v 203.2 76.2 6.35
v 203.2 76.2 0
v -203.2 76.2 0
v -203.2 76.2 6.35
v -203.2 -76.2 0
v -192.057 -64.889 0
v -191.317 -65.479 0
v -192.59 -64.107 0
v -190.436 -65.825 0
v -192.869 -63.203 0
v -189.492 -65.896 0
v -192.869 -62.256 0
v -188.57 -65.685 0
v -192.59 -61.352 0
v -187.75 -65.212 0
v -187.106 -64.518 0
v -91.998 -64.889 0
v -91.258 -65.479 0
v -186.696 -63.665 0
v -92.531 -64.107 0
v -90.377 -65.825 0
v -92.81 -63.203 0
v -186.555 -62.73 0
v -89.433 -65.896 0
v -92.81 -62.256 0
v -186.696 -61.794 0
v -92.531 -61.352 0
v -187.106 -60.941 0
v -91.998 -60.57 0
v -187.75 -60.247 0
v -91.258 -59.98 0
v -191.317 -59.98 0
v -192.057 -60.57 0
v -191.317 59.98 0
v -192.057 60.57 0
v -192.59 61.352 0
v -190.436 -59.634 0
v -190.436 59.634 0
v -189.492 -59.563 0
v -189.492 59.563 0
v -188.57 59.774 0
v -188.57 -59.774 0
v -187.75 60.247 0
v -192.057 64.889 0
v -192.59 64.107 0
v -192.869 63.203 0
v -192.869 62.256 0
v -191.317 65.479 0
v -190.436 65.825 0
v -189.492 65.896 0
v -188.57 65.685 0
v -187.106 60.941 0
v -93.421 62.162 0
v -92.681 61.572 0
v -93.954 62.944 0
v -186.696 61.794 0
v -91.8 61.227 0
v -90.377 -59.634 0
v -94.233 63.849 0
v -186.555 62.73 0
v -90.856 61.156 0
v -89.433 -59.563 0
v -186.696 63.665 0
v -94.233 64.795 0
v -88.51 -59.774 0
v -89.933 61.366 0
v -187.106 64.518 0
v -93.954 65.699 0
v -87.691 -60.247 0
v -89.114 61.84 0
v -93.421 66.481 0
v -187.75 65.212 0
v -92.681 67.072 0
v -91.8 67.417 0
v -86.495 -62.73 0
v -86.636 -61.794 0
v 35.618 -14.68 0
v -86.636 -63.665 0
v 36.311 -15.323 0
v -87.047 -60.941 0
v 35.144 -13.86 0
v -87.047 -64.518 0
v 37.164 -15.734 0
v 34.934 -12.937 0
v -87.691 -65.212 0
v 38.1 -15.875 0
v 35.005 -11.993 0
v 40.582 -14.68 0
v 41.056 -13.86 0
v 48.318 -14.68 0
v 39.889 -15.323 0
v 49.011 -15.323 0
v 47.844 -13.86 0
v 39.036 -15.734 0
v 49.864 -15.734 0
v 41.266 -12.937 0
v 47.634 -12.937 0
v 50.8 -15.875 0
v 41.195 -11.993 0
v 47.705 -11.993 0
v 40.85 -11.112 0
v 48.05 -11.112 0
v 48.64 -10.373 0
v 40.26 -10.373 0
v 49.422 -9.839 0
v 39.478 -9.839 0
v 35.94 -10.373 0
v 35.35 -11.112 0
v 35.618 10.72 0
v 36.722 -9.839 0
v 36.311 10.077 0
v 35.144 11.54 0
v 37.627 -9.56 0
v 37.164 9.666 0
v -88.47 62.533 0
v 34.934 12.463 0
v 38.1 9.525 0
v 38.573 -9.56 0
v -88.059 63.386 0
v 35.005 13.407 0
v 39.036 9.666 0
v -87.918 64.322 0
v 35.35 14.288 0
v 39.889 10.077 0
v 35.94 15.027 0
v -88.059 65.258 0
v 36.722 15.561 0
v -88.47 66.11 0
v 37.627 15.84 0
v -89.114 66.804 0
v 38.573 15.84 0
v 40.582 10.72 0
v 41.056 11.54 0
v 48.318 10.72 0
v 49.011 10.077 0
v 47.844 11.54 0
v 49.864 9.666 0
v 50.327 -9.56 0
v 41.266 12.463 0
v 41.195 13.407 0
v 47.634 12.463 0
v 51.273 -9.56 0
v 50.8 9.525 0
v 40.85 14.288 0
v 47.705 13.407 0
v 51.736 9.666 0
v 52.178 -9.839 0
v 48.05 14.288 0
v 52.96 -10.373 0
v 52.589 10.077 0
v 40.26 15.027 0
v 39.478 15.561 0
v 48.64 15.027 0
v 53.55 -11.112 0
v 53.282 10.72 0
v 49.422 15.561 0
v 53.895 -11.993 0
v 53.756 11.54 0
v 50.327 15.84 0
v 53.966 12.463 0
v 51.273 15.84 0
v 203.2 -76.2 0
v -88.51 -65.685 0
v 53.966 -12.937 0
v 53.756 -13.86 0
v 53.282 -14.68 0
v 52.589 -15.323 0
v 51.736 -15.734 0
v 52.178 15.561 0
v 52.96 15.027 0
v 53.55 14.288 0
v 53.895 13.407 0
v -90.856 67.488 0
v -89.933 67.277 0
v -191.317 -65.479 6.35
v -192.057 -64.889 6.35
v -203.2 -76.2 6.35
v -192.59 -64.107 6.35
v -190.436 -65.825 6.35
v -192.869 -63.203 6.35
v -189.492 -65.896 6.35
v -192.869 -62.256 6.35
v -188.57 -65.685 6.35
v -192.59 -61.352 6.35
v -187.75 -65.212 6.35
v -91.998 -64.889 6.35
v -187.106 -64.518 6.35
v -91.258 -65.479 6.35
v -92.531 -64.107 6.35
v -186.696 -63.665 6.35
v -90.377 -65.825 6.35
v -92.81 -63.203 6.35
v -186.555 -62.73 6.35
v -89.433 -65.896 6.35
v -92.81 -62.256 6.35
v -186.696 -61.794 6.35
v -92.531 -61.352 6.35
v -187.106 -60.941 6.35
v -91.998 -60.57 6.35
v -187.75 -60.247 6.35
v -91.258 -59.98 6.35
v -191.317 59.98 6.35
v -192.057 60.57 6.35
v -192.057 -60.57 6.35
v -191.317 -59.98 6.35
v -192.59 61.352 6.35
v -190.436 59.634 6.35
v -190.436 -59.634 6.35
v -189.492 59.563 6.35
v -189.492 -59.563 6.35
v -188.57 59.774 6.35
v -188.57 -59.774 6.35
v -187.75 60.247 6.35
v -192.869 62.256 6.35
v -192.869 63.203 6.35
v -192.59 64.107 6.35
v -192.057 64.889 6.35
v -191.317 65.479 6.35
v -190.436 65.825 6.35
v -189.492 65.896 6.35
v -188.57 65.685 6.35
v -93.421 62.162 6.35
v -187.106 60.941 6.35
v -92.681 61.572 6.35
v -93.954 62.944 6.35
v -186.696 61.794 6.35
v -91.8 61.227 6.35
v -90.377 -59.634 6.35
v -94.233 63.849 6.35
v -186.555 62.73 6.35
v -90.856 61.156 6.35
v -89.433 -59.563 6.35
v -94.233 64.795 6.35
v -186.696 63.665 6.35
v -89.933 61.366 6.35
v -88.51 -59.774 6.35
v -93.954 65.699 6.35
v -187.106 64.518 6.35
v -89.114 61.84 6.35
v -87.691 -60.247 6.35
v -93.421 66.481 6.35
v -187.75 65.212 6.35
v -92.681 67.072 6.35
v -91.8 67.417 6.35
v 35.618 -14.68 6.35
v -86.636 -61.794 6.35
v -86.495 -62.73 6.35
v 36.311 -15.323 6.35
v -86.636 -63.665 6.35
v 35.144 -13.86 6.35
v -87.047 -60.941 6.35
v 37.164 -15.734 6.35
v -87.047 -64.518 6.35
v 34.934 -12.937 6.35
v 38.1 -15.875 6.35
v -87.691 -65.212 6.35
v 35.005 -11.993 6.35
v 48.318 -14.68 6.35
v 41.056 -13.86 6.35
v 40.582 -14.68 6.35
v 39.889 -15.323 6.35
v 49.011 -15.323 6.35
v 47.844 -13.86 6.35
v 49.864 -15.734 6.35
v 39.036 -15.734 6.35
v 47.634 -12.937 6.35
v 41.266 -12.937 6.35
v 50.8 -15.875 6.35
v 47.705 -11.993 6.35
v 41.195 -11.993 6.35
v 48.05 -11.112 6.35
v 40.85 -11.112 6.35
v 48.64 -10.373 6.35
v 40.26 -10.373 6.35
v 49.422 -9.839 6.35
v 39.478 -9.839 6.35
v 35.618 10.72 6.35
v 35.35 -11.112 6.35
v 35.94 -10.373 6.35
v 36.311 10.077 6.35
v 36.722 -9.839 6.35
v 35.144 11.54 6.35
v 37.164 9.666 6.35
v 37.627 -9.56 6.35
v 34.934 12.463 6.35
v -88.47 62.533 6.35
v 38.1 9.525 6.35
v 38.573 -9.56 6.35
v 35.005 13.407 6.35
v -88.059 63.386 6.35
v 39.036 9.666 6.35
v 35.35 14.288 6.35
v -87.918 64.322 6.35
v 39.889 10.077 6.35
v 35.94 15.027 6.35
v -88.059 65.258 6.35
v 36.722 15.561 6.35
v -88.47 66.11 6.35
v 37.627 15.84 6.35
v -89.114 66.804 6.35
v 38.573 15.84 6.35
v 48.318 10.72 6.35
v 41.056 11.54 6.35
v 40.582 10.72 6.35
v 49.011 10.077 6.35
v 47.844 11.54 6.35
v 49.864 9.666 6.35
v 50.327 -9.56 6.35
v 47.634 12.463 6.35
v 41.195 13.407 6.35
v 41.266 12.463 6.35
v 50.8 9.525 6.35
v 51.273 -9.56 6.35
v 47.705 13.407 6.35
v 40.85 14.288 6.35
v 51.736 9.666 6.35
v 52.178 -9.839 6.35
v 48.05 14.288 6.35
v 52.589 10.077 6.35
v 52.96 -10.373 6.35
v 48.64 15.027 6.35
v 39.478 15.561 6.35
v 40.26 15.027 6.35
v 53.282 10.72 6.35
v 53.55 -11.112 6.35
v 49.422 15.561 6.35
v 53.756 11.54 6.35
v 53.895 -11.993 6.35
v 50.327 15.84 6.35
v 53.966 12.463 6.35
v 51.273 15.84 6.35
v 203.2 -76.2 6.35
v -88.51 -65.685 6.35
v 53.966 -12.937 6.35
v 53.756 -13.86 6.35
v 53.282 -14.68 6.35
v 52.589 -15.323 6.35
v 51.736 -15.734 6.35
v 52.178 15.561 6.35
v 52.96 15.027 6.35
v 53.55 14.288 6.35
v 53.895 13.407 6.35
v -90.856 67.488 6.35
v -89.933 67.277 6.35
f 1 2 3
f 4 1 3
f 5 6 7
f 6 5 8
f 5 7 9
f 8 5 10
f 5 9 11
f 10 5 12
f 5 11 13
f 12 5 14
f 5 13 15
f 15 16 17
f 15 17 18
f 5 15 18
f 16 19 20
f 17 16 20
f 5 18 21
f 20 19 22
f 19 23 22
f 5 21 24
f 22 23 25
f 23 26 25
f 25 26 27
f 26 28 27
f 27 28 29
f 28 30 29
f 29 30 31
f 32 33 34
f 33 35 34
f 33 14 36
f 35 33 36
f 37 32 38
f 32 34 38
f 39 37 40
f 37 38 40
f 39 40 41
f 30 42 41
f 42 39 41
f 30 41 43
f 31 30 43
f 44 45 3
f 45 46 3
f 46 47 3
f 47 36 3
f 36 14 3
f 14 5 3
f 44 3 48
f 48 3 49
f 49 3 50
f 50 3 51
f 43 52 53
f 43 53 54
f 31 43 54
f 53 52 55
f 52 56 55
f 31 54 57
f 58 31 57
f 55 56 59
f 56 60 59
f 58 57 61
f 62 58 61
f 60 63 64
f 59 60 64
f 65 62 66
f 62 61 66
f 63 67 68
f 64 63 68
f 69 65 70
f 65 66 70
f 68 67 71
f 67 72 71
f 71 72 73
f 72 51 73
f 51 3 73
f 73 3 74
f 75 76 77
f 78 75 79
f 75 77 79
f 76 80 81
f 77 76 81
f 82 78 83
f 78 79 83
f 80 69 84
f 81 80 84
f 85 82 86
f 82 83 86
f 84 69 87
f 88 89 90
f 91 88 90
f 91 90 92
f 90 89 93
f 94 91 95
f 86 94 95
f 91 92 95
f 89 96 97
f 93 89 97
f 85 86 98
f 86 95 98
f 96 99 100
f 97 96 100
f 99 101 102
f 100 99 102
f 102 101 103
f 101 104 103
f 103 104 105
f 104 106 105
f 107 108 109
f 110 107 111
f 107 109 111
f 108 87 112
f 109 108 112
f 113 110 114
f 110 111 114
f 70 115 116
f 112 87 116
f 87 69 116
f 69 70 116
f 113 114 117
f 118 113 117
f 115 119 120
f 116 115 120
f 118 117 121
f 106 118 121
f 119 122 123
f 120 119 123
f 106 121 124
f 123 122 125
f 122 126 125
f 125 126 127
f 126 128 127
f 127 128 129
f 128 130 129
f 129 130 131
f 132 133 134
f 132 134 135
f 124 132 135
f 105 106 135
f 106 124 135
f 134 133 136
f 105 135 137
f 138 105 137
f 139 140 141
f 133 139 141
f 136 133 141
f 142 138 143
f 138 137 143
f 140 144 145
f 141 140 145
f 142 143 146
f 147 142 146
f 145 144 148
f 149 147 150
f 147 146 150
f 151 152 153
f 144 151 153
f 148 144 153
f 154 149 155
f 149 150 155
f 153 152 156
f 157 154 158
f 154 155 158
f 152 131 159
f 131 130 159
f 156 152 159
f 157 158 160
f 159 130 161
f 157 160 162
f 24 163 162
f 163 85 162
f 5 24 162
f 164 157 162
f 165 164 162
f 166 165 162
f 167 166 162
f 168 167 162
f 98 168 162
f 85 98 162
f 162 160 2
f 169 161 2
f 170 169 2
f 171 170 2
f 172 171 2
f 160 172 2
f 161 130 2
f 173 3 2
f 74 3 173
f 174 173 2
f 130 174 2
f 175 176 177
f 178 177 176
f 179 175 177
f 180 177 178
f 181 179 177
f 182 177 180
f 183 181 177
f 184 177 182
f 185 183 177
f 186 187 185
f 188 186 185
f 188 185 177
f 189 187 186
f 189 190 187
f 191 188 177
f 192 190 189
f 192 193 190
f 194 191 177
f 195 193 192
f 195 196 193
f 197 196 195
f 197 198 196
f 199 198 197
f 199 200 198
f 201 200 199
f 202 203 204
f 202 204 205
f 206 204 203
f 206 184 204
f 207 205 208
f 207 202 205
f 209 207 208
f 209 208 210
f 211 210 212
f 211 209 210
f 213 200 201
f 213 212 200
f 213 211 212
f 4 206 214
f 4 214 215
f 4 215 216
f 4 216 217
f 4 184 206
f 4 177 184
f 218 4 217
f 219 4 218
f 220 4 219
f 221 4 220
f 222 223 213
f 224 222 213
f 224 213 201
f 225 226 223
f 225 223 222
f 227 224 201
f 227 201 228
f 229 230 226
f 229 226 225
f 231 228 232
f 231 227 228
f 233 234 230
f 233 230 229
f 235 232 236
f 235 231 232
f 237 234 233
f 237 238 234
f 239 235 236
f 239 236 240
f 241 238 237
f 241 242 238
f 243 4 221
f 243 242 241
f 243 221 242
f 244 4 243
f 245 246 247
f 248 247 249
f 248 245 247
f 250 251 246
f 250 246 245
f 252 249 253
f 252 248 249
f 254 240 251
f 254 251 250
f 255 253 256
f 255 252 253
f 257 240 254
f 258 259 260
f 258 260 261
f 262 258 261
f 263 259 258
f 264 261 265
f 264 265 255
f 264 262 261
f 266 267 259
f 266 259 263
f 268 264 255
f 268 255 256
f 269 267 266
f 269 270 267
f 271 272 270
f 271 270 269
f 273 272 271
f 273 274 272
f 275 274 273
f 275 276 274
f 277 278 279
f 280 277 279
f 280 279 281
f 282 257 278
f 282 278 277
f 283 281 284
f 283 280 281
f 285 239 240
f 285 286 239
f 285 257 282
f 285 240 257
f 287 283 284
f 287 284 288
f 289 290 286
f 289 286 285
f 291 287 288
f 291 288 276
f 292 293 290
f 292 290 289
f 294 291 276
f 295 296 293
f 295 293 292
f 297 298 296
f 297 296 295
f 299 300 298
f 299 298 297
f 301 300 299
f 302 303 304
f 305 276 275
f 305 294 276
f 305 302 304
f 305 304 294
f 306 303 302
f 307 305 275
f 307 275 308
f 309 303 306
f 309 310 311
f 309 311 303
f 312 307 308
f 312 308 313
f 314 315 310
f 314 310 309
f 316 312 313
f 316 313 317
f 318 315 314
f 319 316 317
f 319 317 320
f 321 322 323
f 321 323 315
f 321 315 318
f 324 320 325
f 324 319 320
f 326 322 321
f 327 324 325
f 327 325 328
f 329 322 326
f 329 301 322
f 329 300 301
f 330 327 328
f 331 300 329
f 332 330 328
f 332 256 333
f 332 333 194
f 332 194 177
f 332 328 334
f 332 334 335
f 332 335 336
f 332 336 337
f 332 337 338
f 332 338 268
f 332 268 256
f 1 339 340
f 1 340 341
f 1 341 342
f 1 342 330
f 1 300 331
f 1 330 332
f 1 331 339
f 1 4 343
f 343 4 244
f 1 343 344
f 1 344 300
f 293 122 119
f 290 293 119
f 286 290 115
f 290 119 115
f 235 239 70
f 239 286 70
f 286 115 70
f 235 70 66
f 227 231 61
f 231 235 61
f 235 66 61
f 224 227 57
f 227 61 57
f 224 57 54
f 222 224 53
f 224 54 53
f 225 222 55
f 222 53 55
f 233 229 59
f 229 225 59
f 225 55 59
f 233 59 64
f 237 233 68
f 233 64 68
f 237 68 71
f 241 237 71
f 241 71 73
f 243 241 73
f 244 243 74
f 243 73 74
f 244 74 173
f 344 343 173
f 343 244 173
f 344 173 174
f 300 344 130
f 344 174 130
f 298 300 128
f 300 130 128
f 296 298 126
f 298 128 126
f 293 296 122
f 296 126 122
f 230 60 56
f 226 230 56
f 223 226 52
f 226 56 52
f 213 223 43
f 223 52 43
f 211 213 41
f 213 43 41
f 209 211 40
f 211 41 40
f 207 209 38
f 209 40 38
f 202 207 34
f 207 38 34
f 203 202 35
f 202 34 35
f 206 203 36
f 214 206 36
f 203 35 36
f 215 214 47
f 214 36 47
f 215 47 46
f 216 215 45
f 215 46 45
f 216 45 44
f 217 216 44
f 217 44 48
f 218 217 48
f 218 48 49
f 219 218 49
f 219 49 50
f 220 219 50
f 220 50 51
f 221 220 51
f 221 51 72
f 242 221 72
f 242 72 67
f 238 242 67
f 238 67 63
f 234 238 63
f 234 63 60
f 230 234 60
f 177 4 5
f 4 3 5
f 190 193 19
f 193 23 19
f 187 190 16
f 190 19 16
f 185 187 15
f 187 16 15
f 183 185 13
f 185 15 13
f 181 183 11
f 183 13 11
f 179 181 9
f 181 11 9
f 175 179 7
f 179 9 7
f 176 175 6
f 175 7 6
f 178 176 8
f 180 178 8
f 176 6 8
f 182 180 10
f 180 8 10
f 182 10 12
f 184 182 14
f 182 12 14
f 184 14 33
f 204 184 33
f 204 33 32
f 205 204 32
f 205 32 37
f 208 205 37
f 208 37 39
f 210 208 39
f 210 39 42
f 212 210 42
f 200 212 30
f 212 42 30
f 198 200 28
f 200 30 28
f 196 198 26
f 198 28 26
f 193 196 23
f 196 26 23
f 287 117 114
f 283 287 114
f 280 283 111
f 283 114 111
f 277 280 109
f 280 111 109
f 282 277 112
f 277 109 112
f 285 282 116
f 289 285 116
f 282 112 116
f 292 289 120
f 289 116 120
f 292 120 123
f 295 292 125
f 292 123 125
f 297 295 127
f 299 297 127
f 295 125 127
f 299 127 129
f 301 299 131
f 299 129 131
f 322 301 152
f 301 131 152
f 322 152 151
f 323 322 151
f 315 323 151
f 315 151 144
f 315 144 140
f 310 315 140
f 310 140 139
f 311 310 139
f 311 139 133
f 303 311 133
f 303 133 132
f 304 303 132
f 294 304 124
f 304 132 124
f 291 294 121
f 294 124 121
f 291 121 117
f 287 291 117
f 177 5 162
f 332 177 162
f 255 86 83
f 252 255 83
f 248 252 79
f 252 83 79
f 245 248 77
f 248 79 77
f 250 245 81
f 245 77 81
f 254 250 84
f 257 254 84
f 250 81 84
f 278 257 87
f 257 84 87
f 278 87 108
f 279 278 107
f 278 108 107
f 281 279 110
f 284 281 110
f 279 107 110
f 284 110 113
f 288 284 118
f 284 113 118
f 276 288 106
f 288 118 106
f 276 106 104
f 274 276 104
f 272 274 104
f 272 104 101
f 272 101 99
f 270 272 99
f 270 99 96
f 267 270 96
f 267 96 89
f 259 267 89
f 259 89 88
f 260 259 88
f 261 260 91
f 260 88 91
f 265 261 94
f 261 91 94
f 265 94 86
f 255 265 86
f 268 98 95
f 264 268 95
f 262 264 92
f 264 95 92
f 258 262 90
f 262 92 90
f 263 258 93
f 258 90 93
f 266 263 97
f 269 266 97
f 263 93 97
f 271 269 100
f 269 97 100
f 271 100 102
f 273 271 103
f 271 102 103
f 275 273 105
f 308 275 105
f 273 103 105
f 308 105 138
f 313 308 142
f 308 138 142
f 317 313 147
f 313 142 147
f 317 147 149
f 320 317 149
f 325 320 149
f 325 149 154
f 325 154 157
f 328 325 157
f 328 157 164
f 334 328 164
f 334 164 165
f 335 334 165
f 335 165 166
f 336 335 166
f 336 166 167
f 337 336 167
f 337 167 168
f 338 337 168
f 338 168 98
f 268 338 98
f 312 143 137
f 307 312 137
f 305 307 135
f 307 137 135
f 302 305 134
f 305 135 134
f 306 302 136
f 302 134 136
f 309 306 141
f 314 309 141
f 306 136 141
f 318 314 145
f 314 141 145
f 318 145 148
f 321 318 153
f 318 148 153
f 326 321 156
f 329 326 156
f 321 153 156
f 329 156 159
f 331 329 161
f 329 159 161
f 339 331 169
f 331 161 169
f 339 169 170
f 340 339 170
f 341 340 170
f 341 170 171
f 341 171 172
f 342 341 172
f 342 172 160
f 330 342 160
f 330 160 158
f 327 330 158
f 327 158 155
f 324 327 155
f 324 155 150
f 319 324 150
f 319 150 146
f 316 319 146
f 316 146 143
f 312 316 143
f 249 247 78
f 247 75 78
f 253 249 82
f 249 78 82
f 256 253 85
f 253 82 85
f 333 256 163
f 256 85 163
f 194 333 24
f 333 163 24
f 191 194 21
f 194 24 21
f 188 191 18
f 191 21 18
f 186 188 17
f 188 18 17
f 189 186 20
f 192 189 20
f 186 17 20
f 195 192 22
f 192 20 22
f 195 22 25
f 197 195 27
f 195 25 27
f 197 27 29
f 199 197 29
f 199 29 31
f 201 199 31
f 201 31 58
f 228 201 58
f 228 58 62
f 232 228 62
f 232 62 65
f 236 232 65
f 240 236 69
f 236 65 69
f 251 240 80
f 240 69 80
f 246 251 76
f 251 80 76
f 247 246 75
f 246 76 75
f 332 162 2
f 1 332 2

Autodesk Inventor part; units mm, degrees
ref_plane "YZ Plane" through (0, 0, 0) normal (1, 0, 0) x (0, 1, 0)
ref_plane "XZ Plane" through (0, 0, 0) normal (0, 1, 0) x (-1, 0, 0)
ref_plane "XY Plane" through (0, 0, 0) normal (0, 0, 1) x (1, 0, 0)
sketch "Sketch1" plane through (0, 0, 0) normal (0, 0, 1) x (1, 0, 0)
  line L0 (-203.2, -76.2) -> (203.2, -76.2)
  line L1 (203.2, -76.2) -> (203.2, 76.2)
  line L2 (203.2, 76.2) -> (-203.2, 76.2)
  line L3 (-203.2, 76.2) -> (-203.2, -76.2)
  line L4 (-203.2, -76.2) -> (203.2, 76.2) construction
  line L5 (203.2, -76.2) -> (-203.2, 76.2) construction
  line L6 (-203.2, 76.2) -> (-189.7296, 62.7296)
  line L7 (-203.2, 76.2) -> (-184.15, 76.2) construction
  line L8 (-203.2, -76.2) -> (-189.7296, -62.7296)
  line L9 (-203.2, -76.2) -> (-184.15, -76.2) construction
  line L10 (-203.2, -76.2) -> (-193.675, -76.2)
  line L11 (-203.2, -76.2) -> (-76.2, -76.2) construction
  line L12 (-76.2, -76.2) -> (-89.6704, -62.7296) construction
  circle A0 centre (-189.7296, 62.7296) radius 3.175
  circle A1 centre (-89.6704, -62.7296) radius 3.175
  circle A2 centre (-189.7296, -62.7296) radius 3.175
  line L13 (-189.7296, 62.7296) -> (-89.6704, -62.7296)
  line L14 (-203.2, 76.2) -> (-76.2, 76.2) construction
  line L15 (-76.2, 76.2) -> (-91.0934, 64.3219) construction
  circle A3 centre (-91.0934, 64.3219) radius 3.175
  point P0 (0, 0)
  dimension "d0" = 406.4
  dimension "d1" = 152.4
  dimension "d2" = 19.05
  dimension "d3" = 45
  dimension "d4" = 19.05
  dimension "d5" = 45
  dimension "d6" = 127
  dimension "d7" = 19.05
  dimension "d8" = 6.35
  dimension "d10" = 6.35
  dimension "d11" = 6.35
  dimension "d15" = 127
  dimension "d16" = 6.35
extrude "Extrusion2" add sketch "Sketch1" along normal blind 6.35
sketch "Sketch2" plane through (0, 0, 6.35) normal (0, 0, 1) x (1, 0, 0)
  line L0 (203.2, -76.2) -> (203.2, 76.2) projected
  line L1 (-203.2, 76.2) -> (-203.2, -76.2) projected
  line L2 (203.2, 0) -> (38.1, 0) construction
  line L3 (38.1, 0) -> (38.1, 12.7) construction
  line L4 (38.1, 0) -> (38.1, -12.7) construction
  line L5 (38.1, 0) -> (50.8, 0) construction
  line L6 (50.8, 0) -> (50.8, 12.7) construction
  line L7 (50.8, 12.7) -> (50.8, -12.7) construction
  point P0 (0, 0)
  dimension "d19" = 165.1
  dimension "d20" = 12.7
  dimension "d21" = 12.7
  dimension "d22" = 12.7
  dimension "d23" = 12.7
  dimension "d24" = 25.4
hole "Hole1" at (50.8, 12.7, 6.35) at (50.8, -12.7, 6.35) at (38.1, -12.7, 6.35) at (38.1, 12.7, 6.35) direction (0, 0, -1) diameter 6.35 end through all
properties part number "big plate"
